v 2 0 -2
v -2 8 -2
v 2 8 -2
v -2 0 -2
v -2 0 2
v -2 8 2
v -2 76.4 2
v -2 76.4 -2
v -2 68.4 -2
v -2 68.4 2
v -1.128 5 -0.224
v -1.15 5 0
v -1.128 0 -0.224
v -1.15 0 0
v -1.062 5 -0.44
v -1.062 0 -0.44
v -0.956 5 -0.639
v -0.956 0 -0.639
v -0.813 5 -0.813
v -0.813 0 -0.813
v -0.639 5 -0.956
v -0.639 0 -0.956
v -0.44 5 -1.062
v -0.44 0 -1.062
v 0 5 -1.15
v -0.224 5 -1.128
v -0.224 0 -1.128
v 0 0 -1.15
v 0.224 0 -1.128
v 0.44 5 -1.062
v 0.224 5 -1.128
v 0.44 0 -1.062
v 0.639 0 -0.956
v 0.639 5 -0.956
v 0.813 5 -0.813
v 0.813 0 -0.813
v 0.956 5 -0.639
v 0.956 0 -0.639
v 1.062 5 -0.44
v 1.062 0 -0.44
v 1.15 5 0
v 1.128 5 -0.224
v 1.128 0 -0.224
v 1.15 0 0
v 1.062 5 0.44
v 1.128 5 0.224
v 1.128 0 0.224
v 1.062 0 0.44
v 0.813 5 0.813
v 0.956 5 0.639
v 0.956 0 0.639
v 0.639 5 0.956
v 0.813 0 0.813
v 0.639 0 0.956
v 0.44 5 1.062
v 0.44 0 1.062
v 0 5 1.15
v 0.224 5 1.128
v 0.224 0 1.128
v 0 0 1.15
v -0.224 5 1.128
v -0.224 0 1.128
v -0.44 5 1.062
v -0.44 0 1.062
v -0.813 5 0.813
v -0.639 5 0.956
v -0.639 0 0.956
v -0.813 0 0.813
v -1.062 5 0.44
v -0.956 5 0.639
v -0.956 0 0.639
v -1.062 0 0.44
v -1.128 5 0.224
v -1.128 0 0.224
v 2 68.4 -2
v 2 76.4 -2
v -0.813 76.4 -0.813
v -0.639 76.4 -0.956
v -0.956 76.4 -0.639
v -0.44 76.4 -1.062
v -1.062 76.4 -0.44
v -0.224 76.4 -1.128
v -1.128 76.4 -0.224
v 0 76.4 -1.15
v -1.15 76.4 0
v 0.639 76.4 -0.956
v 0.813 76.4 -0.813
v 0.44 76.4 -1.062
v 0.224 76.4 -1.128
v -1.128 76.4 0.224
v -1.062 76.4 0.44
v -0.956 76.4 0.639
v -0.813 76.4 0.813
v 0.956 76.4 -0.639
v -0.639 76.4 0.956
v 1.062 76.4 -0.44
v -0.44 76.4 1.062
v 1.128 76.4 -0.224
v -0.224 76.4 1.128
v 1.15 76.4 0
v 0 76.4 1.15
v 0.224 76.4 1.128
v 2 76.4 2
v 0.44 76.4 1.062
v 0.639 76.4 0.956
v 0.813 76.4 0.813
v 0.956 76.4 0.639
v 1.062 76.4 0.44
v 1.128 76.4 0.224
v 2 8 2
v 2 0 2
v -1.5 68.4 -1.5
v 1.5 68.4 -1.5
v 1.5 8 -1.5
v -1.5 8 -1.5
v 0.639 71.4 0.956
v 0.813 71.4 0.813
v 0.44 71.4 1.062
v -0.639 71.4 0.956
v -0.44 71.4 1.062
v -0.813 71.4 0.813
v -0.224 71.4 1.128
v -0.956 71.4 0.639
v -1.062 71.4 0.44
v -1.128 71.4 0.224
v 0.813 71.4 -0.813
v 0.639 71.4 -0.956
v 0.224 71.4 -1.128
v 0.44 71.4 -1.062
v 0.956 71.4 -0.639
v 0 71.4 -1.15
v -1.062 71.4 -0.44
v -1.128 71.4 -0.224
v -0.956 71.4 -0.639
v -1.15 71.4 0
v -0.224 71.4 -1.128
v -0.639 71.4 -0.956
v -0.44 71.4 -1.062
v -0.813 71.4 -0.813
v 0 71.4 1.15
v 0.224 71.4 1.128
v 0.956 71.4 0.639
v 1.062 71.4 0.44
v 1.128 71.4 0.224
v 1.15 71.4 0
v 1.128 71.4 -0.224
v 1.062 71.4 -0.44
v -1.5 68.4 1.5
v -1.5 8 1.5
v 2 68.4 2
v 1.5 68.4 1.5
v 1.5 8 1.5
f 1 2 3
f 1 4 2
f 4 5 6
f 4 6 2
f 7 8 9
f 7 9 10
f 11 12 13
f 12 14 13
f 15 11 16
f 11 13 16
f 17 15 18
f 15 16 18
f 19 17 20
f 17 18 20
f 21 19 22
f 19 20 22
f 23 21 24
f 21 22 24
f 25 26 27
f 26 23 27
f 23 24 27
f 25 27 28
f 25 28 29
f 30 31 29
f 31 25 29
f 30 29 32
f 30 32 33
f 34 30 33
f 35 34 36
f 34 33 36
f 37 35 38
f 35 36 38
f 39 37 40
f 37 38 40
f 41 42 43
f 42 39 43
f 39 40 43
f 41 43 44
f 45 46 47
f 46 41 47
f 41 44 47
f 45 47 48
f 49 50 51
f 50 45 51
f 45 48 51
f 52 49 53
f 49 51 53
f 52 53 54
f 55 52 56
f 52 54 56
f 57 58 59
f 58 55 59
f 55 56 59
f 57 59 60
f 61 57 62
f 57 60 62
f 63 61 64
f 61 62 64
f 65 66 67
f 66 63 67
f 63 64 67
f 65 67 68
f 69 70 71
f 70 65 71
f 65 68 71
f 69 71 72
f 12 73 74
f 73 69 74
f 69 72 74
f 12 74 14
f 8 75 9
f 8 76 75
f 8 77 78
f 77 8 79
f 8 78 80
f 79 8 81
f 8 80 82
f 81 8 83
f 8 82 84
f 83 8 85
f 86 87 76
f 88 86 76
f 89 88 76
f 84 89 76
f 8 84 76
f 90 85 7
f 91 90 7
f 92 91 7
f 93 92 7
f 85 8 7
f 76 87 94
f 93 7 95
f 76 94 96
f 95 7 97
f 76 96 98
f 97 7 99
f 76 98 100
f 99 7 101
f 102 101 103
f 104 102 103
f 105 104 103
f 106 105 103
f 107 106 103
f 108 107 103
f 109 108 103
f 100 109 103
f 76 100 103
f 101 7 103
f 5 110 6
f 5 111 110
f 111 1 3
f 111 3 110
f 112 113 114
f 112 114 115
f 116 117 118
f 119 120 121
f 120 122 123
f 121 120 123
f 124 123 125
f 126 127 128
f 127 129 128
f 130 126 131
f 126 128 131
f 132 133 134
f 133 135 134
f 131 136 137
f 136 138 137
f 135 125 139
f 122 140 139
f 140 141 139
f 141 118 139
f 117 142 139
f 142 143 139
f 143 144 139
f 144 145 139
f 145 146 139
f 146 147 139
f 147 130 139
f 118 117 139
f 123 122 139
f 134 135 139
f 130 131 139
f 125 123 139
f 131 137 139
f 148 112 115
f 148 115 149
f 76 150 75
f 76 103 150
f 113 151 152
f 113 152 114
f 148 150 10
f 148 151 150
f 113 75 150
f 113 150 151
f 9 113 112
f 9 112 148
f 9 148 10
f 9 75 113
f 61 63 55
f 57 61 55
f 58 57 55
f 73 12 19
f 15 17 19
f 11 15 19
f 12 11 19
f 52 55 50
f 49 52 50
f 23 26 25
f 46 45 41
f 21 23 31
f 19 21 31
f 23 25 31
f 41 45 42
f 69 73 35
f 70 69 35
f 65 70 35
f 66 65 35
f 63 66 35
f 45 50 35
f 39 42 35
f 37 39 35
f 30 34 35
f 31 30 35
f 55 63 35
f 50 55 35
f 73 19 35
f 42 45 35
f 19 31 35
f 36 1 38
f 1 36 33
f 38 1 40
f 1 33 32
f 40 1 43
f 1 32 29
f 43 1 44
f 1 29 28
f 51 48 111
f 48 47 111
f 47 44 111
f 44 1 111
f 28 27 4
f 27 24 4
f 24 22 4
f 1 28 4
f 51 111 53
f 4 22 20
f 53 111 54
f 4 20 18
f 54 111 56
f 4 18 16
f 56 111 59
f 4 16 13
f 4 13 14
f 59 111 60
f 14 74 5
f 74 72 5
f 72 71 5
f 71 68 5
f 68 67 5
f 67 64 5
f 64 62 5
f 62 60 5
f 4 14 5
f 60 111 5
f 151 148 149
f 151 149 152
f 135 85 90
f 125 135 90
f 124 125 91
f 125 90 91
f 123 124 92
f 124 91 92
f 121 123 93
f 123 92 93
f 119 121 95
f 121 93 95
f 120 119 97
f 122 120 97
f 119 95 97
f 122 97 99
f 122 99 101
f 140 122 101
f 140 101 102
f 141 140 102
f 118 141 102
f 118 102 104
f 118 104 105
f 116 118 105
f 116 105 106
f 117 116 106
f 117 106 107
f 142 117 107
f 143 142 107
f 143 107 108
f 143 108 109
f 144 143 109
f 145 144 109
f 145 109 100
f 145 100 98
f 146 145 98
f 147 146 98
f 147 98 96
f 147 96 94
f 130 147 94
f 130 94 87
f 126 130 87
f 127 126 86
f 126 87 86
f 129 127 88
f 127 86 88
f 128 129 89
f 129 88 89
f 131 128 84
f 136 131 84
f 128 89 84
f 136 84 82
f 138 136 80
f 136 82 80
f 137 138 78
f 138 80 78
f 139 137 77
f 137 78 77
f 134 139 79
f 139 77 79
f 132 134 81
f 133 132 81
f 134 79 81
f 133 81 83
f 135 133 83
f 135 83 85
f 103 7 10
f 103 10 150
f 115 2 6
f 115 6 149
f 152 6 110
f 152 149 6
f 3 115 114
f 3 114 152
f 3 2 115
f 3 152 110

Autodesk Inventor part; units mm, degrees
ref_plane "YZ Plane" through (0, 0, 0) normal (1, 0, 0) x (0, 1, 0)
ref_plane "XZ Plane" through (0, 0, 0) normal (0, 1, 0) x (-1, 0, 0)
sketch "Sketch1" plane through (0, 0, 0) normal (0, 1, 0) x (-1, 0, 0)
  circle A0 centre (0, 0) radius 1.15
  circle A1 centre (0, 0) radius 2
  line L0 (-2, 2) -> (2, 2)
  line L1 (2, 2) -> (2, -2)
  line L2 (2, -2) -> (-2, -2)
  line L3 (-2, -2) -> (-2, 2)
  line L4 (-2, 2) -> (2, -2) construction
  line L5 (2, 2) -> (-2, -2) construction
  dimension "d0" = 2.3
  dimension "d1" = 4
extrude "Extrusion1" add sketch "Sketch1" along normal blind 5
sketch "Sketch2" plane through (0, 5, 0) normal (0, 1, 0) x (1, 0, 0)
  line L0 (2, 2) -> (-2, 2) projected
  line L1 (-2, 2) -> (-2, -2) projected
  line L2 (-2, -2) -> (2, -2) projected
  line L3 (2, -2) -> (2, 2) projected
  circle A0 centre (0, 0) radius 1.15 projected
extrude "Extrusion2" add sketch "Sketch2" along normal blind 3 contours L3 L2 L1 L0 | A0
sketch "Sketch3" plane through (0, 8, 0) normal (0, 1, 0) x (1, 0, 0)
  line L0 (1.5, -1.5) -> (-1.5, -1.5)
  line L1 (-1.5, -1.5) -> (-1.5, 1.5)
  line L2 (-1.5, 1.5) -> (1.5, 1.5)
  line L3 (1.5, 1.5) -> (1.5, -1.5)
  line L4 (1.5, -1.5) -> (-1.5, 1.5) construction
  line L5 (-1.5, -1.5) -> (1.5, 1.5) construction
  point P0 (0, 0)
  dimension "d6" = 3
extrude "Extrusion3" add sketch "Sketch3" along normal blind 44.25
ref_plane "Work Plane1" through (0, 38.2, 0) normal (0, -1, 0) x (1, 0, 0)
mirror "Mirror1" about plane through (0, 38.2, 0) normal (0, -1, 0) of "Extrusion3", "Extrusion1", "Extrusion2"
properties part number "clamshell cross link" material "ABS Plastic"
